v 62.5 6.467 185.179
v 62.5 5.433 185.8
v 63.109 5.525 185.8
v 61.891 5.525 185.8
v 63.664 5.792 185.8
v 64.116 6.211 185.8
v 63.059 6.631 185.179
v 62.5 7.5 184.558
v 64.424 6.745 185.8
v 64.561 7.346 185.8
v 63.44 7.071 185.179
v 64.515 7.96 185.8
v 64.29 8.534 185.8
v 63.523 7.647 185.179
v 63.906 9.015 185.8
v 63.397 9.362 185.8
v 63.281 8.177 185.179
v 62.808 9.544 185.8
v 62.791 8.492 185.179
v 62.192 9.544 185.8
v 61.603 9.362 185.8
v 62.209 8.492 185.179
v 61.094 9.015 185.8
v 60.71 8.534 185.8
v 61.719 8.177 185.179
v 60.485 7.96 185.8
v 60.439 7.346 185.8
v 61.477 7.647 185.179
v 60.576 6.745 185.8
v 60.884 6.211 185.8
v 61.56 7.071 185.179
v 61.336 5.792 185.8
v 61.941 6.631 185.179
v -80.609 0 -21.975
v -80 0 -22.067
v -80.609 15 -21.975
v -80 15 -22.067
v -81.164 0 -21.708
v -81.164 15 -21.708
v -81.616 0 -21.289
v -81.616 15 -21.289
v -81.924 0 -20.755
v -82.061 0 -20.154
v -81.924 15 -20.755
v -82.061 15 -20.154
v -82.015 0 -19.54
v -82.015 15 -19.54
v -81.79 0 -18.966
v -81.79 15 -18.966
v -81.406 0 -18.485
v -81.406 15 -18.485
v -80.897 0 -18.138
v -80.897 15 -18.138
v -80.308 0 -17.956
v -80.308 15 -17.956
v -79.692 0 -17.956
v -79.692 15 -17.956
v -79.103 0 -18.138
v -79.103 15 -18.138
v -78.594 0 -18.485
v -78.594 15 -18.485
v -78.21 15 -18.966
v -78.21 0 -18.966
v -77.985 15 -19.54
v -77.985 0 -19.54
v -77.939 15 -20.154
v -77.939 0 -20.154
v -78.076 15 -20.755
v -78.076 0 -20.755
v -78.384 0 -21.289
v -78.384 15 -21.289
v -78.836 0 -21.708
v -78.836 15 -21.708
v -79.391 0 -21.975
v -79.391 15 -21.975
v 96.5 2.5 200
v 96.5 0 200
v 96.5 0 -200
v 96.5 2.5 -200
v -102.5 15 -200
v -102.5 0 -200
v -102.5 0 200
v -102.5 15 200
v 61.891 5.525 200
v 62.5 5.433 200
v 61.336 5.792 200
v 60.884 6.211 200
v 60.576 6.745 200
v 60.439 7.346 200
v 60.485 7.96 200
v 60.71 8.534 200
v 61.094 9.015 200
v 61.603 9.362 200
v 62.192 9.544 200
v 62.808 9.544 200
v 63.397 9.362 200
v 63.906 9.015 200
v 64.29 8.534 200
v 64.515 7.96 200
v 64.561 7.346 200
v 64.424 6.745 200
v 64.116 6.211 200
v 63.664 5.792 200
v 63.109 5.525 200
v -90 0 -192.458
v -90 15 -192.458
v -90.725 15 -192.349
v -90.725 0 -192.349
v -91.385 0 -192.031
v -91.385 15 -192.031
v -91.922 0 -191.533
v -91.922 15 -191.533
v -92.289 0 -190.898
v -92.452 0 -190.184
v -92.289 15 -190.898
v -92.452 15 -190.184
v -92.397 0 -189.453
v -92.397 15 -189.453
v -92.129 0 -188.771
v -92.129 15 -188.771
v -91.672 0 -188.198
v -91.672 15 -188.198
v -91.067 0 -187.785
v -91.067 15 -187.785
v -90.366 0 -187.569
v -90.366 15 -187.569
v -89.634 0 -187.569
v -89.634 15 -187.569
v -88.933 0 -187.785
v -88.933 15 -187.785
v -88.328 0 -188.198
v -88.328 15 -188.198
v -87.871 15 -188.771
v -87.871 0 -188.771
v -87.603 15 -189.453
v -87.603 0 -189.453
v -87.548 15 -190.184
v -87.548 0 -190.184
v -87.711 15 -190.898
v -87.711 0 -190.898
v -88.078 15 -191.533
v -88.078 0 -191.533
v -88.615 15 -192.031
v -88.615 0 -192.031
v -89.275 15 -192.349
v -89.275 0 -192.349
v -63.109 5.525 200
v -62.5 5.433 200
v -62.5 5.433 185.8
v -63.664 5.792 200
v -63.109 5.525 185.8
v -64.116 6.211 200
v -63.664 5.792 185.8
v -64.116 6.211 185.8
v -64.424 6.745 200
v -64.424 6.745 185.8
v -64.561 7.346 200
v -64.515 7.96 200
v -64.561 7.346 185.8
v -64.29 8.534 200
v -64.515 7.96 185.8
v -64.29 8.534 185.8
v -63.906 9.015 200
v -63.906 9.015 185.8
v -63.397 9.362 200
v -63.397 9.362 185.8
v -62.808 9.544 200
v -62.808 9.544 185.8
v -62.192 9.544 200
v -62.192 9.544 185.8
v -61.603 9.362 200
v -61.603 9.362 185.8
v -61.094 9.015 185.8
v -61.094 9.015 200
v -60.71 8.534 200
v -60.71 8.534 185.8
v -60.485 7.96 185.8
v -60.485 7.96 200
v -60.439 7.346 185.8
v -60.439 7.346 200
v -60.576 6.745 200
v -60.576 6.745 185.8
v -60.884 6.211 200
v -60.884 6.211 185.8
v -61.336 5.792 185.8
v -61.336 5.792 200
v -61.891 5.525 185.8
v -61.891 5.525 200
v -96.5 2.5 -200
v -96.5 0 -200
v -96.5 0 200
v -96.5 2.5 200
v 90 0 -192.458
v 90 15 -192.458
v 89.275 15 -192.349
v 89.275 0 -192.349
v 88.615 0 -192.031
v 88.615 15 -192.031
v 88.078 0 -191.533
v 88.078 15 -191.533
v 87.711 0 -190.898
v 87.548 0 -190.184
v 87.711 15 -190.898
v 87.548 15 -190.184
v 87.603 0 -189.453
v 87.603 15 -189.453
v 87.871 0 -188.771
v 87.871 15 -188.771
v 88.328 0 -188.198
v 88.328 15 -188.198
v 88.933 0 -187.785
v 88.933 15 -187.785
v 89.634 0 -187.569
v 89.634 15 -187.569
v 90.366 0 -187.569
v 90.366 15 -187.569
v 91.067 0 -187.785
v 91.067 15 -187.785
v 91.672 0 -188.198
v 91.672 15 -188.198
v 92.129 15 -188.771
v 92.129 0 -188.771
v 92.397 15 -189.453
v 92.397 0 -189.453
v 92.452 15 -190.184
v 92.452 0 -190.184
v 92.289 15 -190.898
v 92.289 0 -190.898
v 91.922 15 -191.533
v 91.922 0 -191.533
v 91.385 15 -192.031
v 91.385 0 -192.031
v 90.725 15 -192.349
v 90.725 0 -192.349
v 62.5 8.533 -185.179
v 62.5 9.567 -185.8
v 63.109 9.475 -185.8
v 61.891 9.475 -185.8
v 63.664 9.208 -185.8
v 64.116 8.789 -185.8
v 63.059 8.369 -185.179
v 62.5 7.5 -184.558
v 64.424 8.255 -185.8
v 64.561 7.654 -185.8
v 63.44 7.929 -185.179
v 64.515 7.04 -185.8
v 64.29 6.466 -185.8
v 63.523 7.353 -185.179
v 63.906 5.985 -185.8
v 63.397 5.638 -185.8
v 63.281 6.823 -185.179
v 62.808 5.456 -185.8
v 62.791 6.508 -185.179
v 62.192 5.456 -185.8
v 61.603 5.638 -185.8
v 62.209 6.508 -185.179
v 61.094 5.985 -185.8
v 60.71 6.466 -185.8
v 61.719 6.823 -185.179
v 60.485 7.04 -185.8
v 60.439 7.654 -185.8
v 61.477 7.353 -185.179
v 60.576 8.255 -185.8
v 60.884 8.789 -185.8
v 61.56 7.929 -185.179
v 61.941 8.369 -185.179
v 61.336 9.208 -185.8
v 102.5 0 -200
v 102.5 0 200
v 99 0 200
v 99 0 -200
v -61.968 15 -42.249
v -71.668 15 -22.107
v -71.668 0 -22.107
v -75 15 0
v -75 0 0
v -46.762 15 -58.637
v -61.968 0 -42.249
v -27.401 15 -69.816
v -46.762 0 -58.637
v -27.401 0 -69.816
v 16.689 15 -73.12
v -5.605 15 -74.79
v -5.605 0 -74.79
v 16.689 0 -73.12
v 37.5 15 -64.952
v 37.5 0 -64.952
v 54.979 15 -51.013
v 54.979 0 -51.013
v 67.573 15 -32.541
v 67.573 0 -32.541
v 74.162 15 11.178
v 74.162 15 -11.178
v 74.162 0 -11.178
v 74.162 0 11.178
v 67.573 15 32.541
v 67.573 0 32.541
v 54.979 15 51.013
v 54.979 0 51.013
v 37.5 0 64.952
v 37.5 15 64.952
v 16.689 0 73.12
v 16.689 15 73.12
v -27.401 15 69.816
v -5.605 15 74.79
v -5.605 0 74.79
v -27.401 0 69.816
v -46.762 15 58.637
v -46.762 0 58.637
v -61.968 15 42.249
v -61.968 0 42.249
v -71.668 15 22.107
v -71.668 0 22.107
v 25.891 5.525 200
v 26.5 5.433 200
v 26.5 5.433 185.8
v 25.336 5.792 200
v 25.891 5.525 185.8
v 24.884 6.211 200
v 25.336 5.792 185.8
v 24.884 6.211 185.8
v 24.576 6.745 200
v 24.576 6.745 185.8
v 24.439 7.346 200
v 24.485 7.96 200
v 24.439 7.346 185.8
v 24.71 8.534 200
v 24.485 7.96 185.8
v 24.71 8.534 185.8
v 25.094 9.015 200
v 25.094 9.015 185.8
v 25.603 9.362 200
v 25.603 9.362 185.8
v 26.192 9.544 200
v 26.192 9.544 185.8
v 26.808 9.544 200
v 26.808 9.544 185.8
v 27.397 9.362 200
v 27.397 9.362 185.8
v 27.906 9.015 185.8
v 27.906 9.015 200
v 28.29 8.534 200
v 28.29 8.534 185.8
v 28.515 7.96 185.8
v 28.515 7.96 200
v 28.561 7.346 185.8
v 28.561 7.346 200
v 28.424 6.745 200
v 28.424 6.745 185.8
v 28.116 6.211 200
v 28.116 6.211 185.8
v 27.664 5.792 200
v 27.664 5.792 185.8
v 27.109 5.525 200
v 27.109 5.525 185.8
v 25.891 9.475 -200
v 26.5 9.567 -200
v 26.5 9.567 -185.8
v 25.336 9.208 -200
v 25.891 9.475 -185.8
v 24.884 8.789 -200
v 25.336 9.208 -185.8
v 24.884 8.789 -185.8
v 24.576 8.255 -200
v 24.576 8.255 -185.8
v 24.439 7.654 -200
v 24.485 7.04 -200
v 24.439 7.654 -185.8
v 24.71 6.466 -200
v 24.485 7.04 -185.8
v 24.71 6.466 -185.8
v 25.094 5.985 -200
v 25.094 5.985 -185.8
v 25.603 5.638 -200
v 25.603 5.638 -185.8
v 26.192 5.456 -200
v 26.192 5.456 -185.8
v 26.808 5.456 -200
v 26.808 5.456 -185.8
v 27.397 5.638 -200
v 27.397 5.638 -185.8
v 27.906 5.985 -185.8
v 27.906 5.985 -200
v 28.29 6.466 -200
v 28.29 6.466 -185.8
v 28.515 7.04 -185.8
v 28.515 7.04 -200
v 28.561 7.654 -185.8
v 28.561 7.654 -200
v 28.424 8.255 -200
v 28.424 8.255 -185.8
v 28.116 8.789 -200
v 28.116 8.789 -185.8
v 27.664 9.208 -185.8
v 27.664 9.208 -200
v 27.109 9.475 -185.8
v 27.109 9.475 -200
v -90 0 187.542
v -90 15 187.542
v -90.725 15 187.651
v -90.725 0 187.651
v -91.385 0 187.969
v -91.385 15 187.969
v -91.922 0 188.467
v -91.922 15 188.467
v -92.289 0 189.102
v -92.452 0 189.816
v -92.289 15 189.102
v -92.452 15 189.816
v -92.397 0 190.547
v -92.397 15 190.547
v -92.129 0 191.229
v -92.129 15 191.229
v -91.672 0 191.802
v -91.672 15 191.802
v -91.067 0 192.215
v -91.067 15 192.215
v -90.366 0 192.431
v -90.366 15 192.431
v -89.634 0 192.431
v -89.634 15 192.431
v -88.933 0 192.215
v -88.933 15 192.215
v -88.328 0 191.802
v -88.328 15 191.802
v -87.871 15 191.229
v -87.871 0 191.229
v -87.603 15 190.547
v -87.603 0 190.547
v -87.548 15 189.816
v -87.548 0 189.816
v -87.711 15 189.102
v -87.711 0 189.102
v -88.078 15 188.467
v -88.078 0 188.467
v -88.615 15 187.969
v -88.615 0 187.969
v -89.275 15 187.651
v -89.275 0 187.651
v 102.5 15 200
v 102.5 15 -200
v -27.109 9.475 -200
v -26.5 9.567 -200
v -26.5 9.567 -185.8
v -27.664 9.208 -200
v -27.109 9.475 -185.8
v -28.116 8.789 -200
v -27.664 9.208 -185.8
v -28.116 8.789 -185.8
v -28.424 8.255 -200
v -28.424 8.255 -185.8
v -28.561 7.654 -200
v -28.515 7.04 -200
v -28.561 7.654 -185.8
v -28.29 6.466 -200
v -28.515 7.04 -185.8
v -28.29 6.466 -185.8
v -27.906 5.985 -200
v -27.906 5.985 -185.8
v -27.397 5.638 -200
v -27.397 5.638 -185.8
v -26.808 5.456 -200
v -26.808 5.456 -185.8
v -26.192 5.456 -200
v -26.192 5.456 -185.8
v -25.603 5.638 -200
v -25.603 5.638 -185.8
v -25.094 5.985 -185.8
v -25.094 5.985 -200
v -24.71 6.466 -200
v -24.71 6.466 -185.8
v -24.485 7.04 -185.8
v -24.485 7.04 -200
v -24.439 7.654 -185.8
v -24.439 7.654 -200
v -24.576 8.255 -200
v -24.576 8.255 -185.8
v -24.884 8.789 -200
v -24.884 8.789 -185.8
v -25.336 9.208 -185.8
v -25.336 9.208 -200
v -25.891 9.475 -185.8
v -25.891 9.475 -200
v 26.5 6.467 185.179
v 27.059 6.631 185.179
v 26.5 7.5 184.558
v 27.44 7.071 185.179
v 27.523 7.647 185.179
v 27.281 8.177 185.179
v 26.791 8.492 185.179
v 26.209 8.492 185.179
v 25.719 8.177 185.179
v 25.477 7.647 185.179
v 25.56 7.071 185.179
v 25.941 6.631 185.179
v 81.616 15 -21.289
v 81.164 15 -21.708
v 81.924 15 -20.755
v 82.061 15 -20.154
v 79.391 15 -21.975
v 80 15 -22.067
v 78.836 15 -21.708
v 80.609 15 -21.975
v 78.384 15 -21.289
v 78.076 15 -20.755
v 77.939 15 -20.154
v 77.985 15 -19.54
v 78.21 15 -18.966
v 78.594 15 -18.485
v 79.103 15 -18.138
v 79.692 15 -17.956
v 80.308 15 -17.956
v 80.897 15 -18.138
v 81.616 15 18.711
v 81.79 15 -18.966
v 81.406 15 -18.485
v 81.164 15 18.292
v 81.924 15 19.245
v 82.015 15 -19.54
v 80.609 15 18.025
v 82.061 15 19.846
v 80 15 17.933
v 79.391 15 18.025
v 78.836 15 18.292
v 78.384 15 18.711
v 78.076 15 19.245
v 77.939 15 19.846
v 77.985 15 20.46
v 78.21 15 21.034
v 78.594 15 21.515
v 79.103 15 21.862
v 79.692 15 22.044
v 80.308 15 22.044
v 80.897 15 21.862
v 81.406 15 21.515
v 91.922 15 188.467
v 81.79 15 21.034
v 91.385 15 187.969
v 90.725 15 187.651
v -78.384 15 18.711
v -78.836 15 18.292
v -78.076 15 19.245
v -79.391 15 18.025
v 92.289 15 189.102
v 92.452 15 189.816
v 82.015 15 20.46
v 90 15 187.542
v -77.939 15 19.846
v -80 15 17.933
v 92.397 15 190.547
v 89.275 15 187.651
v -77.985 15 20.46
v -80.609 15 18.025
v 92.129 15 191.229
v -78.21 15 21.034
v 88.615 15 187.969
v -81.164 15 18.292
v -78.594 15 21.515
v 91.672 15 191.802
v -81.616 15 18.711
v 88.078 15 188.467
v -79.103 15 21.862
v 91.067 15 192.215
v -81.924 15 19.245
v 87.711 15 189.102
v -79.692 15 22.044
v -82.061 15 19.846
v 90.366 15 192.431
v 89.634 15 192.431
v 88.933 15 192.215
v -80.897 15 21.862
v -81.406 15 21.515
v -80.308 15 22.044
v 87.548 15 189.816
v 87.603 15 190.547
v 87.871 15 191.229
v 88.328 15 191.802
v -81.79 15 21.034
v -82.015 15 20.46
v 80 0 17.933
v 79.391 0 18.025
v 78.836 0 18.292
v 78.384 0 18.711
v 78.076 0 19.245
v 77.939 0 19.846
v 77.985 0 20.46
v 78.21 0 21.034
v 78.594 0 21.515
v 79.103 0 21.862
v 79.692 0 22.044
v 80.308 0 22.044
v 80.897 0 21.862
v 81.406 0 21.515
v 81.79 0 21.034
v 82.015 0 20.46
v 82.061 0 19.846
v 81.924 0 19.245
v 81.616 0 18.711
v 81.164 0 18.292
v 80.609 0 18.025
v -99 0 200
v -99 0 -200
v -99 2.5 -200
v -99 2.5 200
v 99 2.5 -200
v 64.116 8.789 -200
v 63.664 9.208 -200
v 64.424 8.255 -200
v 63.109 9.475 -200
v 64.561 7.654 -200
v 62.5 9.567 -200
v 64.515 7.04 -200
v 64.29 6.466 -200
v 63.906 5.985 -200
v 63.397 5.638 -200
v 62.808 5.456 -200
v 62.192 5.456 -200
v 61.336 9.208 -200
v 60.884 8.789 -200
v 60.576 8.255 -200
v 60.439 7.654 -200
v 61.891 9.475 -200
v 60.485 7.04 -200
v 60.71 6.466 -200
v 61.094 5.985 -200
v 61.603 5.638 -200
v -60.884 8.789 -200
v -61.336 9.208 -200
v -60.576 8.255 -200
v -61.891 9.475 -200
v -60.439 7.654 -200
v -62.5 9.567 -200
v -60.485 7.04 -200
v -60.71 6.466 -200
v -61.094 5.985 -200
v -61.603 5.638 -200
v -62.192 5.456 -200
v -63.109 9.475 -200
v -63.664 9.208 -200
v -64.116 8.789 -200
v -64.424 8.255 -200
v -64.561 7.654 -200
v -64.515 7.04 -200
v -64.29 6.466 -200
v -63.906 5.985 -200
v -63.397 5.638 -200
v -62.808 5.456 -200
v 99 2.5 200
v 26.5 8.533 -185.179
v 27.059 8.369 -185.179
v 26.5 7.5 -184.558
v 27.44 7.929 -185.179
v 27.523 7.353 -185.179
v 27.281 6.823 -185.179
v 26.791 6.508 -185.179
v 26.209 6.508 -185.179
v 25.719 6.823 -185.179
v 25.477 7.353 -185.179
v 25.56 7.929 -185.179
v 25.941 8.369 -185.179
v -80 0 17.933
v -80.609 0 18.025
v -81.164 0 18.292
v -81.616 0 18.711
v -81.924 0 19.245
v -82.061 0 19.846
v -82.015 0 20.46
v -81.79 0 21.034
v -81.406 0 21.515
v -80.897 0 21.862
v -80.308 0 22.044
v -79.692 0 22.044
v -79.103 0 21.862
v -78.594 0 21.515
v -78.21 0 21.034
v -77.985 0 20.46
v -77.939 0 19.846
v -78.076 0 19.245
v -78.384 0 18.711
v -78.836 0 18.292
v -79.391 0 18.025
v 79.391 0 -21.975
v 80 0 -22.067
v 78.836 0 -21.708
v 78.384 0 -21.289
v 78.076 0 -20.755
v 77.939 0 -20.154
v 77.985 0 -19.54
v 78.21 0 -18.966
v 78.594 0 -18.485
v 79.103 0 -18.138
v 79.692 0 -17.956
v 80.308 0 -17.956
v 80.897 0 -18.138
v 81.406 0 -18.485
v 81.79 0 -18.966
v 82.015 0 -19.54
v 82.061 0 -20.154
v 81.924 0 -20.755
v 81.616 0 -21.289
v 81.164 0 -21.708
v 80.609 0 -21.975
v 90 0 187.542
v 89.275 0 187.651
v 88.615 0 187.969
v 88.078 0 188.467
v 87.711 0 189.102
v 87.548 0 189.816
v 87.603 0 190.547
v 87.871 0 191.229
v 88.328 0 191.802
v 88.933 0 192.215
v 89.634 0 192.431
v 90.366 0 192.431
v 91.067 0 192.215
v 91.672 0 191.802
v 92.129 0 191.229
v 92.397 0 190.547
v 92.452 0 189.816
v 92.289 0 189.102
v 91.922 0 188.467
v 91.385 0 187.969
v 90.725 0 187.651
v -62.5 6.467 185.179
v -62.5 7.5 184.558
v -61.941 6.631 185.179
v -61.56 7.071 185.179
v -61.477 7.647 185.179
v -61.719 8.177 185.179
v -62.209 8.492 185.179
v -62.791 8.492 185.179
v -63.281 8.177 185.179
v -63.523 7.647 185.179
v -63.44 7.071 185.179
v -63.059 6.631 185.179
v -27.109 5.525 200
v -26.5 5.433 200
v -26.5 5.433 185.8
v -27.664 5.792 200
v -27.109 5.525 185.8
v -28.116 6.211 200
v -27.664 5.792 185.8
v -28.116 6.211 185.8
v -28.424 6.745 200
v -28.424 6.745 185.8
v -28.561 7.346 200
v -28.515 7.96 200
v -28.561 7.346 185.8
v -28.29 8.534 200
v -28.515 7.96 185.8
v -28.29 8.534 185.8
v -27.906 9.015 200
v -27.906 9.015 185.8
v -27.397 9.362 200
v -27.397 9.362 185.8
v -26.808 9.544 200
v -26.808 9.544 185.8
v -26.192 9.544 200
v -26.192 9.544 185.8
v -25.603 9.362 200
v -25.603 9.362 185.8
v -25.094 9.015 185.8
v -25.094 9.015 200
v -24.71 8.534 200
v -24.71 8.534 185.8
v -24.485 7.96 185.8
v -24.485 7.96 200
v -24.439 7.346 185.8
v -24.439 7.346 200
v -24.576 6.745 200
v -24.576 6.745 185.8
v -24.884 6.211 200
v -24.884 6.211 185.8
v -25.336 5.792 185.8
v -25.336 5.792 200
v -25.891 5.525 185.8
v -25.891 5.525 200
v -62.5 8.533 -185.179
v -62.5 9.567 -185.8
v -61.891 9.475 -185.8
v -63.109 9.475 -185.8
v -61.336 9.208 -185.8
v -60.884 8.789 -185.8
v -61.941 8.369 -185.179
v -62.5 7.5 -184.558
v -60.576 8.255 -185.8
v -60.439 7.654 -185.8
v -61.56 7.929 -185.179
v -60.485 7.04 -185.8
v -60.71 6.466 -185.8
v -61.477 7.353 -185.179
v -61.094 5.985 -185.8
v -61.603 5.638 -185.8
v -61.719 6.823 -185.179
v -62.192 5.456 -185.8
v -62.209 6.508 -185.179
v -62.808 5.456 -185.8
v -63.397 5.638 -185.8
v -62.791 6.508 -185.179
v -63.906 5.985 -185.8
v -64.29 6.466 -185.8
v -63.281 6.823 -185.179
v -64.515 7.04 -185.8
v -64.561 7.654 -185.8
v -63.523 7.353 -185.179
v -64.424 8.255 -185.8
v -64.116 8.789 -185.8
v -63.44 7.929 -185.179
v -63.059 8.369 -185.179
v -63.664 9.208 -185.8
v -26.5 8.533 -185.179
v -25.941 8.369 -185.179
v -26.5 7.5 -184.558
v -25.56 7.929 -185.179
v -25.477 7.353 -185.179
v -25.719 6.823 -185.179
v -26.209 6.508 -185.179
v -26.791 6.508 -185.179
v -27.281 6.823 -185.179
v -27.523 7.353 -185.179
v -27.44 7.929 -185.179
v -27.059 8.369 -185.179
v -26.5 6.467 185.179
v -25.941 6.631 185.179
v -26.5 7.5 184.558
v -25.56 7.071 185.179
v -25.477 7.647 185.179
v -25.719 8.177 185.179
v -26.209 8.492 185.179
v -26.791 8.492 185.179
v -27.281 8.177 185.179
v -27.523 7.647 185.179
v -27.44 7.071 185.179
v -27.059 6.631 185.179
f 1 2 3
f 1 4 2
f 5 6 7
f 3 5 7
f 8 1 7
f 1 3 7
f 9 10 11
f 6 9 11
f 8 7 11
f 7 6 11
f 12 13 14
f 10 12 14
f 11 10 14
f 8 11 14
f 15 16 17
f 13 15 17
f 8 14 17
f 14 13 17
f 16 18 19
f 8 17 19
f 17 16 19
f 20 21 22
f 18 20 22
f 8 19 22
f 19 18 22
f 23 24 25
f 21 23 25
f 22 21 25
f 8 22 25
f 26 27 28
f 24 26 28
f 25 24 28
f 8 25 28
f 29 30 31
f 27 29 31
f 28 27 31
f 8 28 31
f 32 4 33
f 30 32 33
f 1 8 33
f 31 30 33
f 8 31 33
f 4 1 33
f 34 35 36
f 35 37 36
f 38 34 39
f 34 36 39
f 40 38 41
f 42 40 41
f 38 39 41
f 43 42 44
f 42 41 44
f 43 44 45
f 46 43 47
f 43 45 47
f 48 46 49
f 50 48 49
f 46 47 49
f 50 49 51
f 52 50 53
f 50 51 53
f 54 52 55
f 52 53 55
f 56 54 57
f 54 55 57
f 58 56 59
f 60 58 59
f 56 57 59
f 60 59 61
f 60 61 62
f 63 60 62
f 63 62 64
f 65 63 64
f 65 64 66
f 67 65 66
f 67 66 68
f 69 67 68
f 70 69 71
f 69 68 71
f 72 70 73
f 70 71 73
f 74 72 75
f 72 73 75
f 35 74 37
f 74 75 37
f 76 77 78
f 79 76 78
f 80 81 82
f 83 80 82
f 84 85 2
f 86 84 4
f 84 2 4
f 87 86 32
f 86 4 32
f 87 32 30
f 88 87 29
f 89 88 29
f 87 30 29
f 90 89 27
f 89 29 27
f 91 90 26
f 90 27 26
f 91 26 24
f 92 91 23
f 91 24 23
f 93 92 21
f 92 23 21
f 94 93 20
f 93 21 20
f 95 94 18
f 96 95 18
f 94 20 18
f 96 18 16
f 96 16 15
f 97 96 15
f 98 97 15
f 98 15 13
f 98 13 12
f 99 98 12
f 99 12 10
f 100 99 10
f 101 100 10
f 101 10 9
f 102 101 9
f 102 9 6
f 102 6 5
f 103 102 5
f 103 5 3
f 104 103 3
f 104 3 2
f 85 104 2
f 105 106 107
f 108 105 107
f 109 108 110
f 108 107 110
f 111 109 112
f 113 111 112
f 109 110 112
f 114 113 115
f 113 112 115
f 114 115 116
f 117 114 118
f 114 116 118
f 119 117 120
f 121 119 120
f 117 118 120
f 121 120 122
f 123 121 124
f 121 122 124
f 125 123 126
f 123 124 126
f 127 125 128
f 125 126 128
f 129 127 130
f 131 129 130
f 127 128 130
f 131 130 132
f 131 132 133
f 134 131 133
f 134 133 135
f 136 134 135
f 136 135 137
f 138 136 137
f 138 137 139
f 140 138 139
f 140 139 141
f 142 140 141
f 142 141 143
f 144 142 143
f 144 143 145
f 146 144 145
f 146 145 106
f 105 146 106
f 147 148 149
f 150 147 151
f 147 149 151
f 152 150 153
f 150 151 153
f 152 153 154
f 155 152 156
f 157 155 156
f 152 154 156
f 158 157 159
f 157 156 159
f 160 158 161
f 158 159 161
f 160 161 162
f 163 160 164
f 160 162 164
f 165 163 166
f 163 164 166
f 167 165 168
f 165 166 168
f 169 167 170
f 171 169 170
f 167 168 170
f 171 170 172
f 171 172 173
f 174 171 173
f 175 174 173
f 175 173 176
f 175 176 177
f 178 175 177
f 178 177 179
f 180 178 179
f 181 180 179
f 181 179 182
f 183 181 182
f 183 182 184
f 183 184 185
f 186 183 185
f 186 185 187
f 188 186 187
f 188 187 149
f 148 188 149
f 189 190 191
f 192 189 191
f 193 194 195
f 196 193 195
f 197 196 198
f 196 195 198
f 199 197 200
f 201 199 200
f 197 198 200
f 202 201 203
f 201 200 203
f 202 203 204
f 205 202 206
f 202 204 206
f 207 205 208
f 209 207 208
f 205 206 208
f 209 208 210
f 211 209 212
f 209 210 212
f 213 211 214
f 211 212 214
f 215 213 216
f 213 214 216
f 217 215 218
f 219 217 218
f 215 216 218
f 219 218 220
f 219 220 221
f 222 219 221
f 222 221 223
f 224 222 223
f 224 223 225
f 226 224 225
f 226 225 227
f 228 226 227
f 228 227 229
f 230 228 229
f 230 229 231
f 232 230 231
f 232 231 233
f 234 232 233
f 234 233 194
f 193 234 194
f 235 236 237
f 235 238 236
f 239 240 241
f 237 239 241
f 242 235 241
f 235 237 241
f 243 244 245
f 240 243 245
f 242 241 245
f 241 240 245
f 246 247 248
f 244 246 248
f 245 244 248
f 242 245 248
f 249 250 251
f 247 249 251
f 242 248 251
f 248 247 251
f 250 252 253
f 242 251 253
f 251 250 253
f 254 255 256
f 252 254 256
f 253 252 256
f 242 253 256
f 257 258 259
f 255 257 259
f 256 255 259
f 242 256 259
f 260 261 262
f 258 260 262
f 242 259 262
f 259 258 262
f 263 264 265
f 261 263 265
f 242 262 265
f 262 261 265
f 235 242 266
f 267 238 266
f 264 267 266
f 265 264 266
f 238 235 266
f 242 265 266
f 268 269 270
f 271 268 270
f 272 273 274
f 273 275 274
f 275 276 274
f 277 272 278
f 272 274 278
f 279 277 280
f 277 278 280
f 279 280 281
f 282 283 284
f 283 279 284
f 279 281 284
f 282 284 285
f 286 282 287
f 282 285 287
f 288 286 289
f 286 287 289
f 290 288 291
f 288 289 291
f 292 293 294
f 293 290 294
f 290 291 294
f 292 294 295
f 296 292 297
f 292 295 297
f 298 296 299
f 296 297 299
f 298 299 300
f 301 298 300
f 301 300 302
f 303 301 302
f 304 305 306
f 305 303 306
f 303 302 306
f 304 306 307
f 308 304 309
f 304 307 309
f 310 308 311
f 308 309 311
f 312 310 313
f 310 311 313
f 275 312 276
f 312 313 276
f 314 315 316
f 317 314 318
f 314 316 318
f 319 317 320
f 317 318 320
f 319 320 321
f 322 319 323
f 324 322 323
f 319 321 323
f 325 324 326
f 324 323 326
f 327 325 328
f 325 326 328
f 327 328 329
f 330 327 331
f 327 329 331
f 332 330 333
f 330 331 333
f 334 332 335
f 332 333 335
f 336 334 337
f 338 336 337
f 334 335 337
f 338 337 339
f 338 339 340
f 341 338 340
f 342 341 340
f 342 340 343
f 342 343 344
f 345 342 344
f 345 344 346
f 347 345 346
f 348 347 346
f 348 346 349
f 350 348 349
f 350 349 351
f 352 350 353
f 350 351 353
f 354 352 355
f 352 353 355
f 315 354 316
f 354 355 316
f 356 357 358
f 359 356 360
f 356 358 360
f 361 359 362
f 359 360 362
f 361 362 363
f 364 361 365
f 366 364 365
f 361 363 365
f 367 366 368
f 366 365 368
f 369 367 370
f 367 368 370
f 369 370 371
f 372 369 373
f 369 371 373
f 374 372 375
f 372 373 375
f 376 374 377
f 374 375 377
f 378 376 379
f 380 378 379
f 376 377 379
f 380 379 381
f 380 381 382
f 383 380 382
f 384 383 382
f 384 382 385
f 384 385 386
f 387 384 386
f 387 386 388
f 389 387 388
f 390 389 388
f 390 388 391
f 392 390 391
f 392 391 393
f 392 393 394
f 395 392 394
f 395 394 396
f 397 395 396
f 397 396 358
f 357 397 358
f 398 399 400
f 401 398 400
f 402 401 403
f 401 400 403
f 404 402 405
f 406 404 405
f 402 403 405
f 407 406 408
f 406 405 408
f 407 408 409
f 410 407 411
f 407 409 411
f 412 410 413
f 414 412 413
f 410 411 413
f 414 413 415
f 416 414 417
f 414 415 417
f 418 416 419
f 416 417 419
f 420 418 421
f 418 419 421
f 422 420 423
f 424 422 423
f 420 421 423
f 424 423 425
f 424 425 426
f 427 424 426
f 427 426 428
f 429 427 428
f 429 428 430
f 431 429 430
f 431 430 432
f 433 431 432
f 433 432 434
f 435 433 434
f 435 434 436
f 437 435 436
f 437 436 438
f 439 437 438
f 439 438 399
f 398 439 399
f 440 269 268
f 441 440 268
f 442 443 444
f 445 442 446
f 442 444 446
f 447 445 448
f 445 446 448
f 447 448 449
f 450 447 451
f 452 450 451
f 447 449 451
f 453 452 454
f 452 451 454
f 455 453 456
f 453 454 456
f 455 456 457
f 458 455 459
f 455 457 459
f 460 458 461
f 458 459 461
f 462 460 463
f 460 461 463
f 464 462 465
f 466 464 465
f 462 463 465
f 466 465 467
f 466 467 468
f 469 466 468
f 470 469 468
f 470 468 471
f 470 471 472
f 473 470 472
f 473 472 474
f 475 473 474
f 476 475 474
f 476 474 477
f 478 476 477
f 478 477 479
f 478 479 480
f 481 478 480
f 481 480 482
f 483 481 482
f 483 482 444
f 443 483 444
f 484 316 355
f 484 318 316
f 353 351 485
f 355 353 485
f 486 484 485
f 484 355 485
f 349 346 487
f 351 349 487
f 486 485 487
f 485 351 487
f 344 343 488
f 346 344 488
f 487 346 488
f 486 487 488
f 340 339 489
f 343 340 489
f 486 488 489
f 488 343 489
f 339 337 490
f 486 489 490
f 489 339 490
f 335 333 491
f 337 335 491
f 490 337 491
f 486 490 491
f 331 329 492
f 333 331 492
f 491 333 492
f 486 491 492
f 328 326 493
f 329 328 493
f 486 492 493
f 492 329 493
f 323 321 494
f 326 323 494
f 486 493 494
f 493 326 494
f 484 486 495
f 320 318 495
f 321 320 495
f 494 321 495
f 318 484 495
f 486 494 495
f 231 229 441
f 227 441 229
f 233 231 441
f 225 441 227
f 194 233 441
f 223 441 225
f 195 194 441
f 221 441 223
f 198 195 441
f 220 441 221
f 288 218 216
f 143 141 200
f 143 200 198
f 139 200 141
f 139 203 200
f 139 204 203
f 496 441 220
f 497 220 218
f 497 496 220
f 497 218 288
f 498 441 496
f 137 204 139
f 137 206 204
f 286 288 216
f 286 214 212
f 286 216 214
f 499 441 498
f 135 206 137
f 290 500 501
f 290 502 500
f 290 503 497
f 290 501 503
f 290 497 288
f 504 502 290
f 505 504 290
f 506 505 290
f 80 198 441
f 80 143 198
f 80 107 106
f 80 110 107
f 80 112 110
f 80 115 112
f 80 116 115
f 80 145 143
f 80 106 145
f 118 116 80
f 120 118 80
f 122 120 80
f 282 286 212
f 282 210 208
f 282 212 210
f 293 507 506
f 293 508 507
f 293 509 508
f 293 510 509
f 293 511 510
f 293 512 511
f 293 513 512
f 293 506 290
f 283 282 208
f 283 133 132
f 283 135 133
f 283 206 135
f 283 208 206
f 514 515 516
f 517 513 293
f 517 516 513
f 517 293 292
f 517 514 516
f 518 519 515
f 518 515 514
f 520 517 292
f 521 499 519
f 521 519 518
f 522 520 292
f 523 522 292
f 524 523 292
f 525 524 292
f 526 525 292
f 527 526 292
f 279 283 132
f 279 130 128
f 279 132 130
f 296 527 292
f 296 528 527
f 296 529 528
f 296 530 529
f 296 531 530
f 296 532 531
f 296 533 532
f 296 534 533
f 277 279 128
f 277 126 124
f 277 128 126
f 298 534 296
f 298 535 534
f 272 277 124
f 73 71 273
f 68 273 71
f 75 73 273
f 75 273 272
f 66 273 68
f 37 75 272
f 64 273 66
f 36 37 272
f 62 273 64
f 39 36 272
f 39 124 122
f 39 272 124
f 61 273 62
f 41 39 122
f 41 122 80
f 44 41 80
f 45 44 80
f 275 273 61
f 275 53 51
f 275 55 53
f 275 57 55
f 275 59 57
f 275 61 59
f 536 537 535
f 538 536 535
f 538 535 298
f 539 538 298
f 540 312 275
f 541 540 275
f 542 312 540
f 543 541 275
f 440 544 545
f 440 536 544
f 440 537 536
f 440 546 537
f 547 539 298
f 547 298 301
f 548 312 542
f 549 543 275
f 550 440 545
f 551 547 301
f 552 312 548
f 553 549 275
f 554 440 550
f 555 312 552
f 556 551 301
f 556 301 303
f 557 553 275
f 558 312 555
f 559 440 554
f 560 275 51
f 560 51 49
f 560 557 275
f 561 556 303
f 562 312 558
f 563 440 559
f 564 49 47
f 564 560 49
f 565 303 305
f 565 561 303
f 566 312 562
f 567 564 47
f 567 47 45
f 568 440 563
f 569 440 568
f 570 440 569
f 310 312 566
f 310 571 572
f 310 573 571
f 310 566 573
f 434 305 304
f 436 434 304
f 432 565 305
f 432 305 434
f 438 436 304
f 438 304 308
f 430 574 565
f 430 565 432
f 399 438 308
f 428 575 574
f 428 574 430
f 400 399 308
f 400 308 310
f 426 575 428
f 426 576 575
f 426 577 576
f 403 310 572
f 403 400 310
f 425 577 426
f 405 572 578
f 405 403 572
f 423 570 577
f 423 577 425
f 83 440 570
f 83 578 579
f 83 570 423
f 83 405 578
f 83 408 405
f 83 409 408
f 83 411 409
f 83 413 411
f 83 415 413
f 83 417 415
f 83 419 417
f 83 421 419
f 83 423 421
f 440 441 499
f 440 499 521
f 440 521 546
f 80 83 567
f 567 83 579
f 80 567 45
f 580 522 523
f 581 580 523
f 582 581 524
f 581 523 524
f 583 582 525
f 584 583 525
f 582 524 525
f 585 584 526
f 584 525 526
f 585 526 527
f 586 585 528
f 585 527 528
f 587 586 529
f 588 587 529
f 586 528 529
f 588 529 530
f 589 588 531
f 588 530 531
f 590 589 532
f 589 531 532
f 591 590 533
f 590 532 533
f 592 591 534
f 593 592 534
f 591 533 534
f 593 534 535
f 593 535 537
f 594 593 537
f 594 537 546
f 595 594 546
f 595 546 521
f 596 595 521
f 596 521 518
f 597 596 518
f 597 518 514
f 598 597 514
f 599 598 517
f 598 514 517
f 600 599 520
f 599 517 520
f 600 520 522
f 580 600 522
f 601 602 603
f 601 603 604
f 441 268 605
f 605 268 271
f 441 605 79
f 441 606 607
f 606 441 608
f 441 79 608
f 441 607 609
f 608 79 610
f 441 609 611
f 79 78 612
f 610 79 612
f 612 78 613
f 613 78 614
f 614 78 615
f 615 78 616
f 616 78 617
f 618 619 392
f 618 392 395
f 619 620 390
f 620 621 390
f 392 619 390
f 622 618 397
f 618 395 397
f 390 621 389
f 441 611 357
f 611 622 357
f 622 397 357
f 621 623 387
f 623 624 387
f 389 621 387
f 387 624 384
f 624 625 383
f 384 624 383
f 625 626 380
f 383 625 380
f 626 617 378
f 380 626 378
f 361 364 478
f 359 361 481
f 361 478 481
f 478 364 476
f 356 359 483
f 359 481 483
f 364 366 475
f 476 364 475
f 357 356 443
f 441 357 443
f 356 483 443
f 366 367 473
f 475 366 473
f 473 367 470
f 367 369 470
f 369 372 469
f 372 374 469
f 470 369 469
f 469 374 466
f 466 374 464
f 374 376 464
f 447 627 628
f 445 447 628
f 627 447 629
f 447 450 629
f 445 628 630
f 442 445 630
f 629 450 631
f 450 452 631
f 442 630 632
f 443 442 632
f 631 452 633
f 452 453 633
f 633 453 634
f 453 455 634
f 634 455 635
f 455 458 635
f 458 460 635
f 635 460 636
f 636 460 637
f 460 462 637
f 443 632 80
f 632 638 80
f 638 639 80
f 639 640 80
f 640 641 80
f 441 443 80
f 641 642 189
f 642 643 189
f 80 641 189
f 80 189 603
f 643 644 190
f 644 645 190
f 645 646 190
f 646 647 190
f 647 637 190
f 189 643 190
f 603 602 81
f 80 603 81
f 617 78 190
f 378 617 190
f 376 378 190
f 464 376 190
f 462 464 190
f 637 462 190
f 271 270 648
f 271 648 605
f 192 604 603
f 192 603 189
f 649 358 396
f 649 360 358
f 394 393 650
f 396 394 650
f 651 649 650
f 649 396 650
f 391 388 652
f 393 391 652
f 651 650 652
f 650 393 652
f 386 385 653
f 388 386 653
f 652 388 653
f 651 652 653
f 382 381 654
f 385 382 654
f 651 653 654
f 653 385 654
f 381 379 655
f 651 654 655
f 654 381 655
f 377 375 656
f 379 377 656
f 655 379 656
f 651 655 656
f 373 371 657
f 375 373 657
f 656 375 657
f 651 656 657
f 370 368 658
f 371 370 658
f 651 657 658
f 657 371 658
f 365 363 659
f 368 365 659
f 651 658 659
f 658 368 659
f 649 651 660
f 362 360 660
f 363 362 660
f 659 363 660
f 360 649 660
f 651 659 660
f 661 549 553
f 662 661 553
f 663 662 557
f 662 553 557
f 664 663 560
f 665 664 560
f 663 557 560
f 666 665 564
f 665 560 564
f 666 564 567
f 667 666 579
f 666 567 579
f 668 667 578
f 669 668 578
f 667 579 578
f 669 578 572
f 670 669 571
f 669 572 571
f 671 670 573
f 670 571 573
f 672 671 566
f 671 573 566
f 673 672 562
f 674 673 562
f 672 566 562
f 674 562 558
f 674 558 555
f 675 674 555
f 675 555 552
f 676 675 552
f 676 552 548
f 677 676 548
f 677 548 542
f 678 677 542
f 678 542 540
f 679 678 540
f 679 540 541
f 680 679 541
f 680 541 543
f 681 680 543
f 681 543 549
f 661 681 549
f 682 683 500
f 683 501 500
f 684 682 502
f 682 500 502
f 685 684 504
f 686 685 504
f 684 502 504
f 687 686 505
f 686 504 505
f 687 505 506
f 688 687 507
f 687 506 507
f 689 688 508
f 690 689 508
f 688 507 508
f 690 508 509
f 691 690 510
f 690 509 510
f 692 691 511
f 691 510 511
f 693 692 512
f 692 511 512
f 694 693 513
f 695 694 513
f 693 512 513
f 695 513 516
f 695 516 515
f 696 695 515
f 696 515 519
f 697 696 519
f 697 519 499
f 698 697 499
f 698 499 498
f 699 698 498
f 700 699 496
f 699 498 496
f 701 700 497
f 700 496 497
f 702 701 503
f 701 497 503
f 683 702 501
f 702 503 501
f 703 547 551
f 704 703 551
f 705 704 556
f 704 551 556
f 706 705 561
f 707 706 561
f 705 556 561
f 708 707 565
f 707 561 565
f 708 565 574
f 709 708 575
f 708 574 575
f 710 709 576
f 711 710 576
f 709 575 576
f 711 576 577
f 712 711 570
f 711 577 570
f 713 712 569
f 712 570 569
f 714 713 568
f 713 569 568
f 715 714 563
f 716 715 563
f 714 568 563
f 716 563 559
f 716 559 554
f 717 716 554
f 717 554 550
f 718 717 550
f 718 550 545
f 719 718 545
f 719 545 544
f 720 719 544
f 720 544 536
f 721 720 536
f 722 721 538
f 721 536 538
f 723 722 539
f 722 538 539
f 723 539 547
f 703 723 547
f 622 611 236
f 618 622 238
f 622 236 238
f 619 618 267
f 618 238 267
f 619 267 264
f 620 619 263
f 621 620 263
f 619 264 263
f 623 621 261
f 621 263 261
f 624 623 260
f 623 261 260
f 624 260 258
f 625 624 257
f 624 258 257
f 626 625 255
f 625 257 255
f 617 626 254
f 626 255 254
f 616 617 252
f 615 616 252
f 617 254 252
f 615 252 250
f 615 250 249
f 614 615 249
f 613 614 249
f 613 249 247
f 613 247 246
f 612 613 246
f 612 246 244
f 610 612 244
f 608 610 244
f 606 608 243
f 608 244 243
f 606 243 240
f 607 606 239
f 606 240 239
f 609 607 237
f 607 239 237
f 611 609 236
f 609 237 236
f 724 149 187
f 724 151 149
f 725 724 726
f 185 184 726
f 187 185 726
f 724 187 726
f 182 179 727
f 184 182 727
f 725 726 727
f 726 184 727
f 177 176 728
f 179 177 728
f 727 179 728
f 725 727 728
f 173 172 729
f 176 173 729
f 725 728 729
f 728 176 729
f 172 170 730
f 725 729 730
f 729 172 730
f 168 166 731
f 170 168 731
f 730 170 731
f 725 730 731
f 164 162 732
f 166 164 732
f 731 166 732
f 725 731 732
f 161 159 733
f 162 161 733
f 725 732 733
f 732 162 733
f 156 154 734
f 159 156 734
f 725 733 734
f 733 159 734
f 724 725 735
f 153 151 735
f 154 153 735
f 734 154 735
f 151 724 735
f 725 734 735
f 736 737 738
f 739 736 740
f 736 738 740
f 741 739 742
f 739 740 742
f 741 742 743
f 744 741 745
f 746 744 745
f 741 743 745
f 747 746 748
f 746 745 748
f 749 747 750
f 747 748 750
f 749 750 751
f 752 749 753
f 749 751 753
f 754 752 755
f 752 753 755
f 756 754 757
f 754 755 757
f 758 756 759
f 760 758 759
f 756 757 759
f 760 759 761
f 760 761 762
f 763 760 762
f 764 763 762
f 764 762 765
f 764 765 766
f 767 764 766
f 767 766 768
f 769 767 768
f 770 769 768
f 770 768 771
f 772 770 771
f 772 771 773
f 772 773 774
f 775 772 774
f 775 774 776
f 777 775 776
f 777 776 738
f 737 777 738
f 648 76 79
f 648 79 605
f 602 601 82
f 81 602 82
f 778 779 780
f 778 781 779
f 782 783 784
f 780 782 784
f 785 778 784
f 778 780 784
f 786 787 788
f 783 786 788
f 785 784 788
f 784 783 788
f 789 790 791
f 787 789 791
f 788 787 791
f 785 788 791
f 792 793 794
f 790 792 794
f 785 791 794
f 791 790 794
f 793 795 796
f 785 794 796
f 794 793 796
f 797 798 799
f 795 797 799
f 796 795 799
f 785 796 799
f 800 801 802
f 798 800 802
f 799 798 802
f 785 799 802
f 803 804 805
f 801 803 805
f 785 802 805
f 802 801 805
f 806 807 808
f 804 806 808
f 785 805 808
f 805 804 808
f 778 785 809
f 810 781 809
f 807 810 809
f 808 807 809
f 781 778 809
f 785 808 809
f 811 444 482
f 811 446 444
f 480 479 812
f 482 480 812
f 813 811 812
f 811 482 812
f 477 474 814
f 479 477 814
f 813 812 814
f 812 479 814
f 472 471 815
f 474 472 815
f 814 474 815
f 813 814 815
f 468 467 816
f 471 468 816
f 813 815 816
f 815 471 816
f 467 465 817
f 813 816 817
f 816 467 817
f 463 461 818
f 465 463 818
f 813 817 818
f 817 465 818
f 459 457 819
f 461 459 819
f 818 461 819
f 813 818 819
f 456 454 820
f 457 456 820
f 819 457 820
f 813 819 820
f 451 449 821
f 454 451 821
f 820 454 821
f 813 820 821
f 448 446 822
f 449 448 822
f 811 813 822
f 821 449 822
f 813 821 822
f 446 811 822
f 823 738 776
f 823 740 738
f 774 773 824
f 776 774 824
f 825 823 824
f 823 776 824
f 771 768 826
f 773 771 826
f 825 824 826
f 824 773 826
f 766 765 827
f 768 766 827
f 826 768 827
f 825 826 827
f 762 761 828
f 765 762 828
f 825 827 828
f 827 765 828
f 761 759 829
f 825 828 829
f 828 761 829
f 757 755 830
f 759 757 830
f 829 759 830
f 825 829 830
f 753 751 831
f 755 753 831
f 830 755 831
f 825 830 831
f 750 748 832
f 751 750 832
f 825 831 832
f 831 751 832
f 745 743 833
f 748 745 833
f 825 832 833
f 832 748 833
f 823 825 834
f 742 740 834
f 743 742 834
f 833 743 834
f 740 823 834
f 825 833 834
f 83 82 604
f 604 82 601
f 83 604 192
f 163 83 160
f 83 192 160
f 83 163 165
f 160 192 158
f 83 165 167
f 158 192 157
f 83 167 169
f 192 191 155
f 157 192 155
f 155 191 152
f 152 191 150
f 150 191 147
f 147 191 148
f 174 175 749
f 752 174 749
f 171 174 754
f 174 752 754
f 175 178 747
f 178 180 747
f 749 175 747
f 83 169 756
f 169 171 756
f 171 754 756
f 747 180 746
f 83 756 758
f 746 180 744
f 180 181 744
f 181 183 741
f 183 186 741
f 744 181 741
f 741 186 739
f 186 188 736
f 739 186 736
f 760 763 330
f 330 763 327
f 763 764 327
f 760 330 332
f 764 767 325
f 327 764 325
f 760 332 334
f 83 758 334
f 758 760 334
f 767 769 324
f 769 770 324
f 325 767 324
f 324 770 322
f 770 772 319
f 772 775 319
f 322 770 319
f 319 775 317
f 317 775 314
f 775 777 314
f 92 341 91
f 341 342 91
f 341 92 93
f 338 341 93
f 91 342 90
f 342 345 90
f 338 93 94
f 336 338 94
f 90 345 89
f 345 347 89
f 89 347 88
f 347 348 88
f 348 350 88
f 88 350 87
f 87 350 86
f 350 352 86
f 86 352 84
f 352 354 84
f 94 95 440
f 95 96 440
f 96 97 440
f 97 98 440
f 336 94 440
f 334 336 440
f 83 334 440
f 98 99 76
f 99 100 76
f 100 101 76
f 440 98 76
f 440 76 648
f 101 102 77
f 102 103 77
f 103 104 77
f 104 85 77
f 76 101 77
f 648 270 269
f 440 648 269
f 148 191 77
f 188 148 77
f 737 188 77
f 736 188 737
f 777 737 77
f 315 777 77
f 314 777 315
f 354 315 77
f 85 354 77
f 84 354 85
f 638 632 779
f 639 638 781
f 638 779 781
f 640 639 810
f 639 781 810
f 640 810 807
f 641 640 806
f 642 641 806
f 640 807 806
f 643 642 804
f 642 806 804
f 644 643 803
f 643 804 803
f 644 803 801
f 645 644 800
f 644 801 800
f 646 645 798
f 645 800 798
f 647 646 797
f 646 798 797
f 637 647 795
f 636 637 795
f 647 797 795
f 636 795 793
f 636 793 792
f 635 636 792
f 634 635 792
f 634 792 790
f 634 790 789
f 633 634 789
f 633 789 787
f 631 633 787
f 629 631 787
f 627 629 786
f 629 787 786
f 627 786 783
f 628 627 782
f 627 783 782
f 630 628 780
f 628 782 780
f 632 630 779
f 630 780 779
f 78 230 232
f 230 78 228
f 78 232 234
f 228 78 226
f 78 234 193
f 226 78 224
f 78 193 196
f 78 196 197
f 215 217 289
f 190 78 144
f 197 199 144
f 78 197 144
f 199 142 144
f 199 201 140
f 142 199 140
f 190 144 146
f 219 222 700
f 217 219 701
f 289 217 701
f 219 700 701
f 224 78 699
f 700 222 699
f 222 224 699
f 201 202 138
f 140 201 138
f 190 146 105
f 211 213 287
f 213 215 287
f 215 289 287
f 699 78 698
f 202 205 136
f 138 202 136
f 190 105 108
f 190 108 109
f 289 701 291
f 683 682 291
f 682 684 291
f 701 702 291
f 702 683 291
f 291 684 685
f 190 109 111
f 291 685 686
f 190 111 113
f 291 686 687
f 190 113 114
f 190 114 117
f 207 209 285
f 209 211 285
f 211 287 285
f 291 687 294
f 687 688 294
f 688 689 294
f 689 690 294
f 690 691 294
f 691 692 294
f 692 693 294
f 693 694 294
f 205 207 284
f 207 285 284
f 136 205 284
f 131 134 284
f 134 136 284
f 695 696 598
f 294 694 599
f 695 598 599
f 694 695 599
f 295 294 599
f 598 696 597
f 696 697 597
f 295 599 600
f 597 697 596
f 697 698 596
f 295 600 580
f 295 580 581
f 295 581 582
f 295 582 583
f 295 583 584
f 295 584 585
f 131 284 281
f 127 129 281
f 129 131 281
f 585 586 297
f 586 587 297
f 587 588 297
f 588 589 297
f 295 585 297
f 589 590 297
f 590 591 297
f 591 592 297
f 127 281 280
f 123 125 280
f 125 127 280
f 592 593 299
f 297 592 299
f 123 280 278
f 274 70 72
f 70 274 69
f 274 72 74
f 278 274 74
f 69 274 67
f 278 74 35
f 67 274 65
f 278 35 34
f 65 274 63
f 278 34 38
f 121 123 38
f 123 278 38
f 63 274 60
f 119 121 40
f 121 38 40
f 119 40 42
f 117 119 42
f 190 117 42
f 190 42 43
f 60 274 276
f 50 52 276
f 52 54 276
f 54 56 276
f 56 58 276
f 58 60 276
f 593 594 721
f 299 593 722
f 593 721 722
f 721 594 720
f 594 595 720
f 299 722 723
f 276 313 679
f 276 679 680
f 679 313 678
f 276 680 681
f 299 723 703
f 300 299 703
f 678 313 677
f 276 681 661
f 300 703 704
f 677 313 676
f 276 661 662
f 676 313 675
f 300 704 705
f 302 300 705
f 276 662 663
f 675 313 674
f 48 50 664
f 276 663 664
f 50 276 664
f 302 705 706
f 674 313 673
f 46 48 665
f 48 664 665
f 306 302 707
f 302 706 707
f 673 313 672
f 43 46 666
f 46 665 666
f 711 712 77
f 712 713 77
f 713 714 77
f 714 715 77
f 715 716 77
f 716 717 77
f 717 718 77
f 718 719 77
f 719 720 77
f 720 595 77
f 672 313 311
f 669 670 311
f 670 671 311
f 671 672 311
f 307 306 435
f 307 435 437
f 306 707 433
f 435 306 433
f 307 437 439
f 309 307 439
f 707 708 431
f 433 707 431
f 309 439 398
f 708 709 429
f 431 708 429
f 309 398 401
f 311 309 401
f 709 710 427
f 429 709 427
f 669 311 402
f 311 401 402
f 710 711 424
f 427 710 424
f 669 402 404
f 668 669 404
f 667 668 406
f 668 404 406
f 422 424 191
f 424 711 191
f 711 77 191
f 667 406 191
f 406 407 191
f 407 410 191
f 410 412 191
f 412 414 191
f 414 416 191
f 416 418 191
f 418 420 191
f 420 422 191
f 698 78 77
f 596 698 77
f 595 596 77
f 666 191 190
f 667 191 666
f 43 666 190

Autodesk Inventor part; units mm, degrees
ref_plane "YZ Plane" through (0, 0, 0) normal (1, 0, 0) x (0, 1, 0)
ref_plane "XZ Plane" through (0, 0, 0) normal (0, 1, 0) x (-1, 0, 0)
ref_plane "XY Plane" through (0, 0, 0) normal (0, 0, 1) x (1, 0, 0)
sketch "Skizze2" plane through (0, 0, 0) normal (0, 1, 0) x (-1, 0, 0)
  circle A0 centre (0, 0) radius 75
  line L0 (-102.5, -200) -> (102.5, -200)
  line L1 (102.5, -200) -> (102.5, 200)
  line L2 (102.5, 200) -> (-102.5, 200)
  line L3 (-102.5, 200) -> (-102.5, -200)
  line L4 (-102.5, -200) -> (102.5, 200) construction
  line L5 (102.5, -200) -> (-102.5, 200) construction
  dimension "d8" = 150
  dimension "d9" = 205
  dimension "d10" = 400
extrude "Extrusion1" add sketch "Skizze2" along normal blind 15
sketch "Skizze3" plane through (0, 0, 0) normal (0, -1, 0) x (1, 0, 0)
  line L0 (-90, -190) -> (90, -190)
  line L1 (90, -190) -> (90, 190)
  line L2 (90, 190) -> (-90, 190)
  line L3 (-90, 190) -> (-90, -190)
  line L4 (-90, -190) -> (90, 190) construction
  line L5 (90, -190) -> (-90, 190) construction
  point P0 (0, 0)
  dimension "d13" = 180
  dimension "d14" = 380
hole "Bohrung1" at (90, 0, -190) at (-90, 0, -190) at (-90, 0, 190) at (90, 0, 190) direction (0, 1, 0) diameter 4.917 end through all thread size "M6x1" class "6H" standard "ISO Metric profile"
sketch "Skizze4" plane through (-102.5, 0, 200) normal (0, 0, 1) x (1, 0, 0)
  line L0 (0, 0) -> (0, 15) projected
  line L1 (0, 0) -> (205, 0) projected
  line L2 (205, 0) -> (205, 15) projected
  point P0 (102.5, 0)
  point P1 (40, 7.5)
  point P2 (165, 7.5)
  point P3 (76, 7.5)
  point P4 (129, 7.5)
  dimension "d23" = 40
  dimension "d24" = 7.5
  dimension "d25" = 7.5
  dimension "d44" = 36
  dimension "d45" = 36
  dimension "d46" = 7.5
  dimension "d47" = 7.5
  dimension "d48" = 40
sketch "Skizze5" plane through (102.5, 0, -200) normal (0, 0, -1) x (-1, 0, 0)
  line L0 (205, 0) -> (205, 15) projected
  line L1 (0, 0) -> (205, 0) projected
  line L2 (0, 0) -> (0, 15) projected
  point P0 (102.5, 0)
  point P1 (40, 7.5)
  point P2 (165, 7.5)
  point P3 (76, 7.5)
  point P4 (129, 7.5)
  dimension "d27" = 40
  dimension "d28" = 7.5
  dimension "d29" = 7.5
  dimension "d49" = 7.5
  dimension "d50" = 7.5
  dimension "d51" = 36
  dimension "d52" = 36
  dimension "d53" = 40
hole "Bohrung4" at (62.5, 7.5, -200) at (26.5, 7.5, -200) at (-26.5, 7.5, -200) at (-62.5, 7.5, -200) direction (0, 0, 1) diameter 4.134 depth 14.2 tip angle 118 thread size "M5x0.8" class "6H" standard "ISO Metric profile"
hole "Bohrung5" at (-62.5, 7.5, 200) at (62.5, 7.5, 200) at (-26.5, 7.5, 200) at (26.5, 7.5, 200) direction (0, 0, -1) diameter 4.134 depth 14.2 tip angle 118 thread size "M5x0.8" class "6H" standard "ISO Metric profile"
sketch "Skizze6" plane through (0, 0, 0) normal (0, -1, 0) x (1, 0, 0)
  line L0 (99, 200) -> (99, -200)
  line L1 (102.5, 200) -> (102.5, -200) projected
  line L2 (96.5, 200) -> (96.5, -200)
  line L3 (-99, -200) -> (-99, 200)
  line L4 (-96.5, -200) -> (-96.5, 200)
  line L5 (102.5, -200) -> (-102.5, -200) projected
  line L6 (96.5, -200) -> (99, -200)
  line L7 (-96.5, -200) -> (-99, -200)
  line L8 (-102.5, 200) -> (102.5, 200) projected
  line L9 (-96.5, 200) -> (-99, 200)
  line L10 (99, 200) -> (96.5, 200)
  line L11 (-102.5, -200) -> (-102.5, 200) projected
  point P0 (0, 0)
  point P1 (96.5, 200)
  dimension "d68" = 2.5
  dimension "d70" = 2.5
  dimension "d84" = 198
  dimension "d85" = 99
extrude "Extrusion2" cut sketch "Skizze6" against normal blind 2.5 contours L0 L5 L2 L8 | L4 L5 L3 L8
sketch "Skizze7" plane through (0, 0, 0) normal (0, -1, 0) x (1, 0, 0)
  line L0 (-80, -20) -> (80, -20)
  line L1 (80, -20) -> (80, 20)
  line L2 (80, 20) -> (-80, 20)
  line L3 (-80, 20) -> (-80, -20)
  line L4 (-80, -20) -> (80, 20) construction
  line L5 (80, -20) -> (-80, 20) construction
  point P0 (0, 0)
  dimension "d74" = 160
  dimension "d75" = 40
hole "Bohrung6" at (-80, 0, 20) at (-80, 0, -20) at (80, 0, -20) at (80, 0, 20) direction (0, 1, 0) diameter 4.134 end through all thread size "M5x0.8" class "6H" standard "ISO Metric profile"
equation "\"d70\" = d68"
equation "\"d85\" = 0.5 * d84"
properties part number "Grundplatte1.0"
